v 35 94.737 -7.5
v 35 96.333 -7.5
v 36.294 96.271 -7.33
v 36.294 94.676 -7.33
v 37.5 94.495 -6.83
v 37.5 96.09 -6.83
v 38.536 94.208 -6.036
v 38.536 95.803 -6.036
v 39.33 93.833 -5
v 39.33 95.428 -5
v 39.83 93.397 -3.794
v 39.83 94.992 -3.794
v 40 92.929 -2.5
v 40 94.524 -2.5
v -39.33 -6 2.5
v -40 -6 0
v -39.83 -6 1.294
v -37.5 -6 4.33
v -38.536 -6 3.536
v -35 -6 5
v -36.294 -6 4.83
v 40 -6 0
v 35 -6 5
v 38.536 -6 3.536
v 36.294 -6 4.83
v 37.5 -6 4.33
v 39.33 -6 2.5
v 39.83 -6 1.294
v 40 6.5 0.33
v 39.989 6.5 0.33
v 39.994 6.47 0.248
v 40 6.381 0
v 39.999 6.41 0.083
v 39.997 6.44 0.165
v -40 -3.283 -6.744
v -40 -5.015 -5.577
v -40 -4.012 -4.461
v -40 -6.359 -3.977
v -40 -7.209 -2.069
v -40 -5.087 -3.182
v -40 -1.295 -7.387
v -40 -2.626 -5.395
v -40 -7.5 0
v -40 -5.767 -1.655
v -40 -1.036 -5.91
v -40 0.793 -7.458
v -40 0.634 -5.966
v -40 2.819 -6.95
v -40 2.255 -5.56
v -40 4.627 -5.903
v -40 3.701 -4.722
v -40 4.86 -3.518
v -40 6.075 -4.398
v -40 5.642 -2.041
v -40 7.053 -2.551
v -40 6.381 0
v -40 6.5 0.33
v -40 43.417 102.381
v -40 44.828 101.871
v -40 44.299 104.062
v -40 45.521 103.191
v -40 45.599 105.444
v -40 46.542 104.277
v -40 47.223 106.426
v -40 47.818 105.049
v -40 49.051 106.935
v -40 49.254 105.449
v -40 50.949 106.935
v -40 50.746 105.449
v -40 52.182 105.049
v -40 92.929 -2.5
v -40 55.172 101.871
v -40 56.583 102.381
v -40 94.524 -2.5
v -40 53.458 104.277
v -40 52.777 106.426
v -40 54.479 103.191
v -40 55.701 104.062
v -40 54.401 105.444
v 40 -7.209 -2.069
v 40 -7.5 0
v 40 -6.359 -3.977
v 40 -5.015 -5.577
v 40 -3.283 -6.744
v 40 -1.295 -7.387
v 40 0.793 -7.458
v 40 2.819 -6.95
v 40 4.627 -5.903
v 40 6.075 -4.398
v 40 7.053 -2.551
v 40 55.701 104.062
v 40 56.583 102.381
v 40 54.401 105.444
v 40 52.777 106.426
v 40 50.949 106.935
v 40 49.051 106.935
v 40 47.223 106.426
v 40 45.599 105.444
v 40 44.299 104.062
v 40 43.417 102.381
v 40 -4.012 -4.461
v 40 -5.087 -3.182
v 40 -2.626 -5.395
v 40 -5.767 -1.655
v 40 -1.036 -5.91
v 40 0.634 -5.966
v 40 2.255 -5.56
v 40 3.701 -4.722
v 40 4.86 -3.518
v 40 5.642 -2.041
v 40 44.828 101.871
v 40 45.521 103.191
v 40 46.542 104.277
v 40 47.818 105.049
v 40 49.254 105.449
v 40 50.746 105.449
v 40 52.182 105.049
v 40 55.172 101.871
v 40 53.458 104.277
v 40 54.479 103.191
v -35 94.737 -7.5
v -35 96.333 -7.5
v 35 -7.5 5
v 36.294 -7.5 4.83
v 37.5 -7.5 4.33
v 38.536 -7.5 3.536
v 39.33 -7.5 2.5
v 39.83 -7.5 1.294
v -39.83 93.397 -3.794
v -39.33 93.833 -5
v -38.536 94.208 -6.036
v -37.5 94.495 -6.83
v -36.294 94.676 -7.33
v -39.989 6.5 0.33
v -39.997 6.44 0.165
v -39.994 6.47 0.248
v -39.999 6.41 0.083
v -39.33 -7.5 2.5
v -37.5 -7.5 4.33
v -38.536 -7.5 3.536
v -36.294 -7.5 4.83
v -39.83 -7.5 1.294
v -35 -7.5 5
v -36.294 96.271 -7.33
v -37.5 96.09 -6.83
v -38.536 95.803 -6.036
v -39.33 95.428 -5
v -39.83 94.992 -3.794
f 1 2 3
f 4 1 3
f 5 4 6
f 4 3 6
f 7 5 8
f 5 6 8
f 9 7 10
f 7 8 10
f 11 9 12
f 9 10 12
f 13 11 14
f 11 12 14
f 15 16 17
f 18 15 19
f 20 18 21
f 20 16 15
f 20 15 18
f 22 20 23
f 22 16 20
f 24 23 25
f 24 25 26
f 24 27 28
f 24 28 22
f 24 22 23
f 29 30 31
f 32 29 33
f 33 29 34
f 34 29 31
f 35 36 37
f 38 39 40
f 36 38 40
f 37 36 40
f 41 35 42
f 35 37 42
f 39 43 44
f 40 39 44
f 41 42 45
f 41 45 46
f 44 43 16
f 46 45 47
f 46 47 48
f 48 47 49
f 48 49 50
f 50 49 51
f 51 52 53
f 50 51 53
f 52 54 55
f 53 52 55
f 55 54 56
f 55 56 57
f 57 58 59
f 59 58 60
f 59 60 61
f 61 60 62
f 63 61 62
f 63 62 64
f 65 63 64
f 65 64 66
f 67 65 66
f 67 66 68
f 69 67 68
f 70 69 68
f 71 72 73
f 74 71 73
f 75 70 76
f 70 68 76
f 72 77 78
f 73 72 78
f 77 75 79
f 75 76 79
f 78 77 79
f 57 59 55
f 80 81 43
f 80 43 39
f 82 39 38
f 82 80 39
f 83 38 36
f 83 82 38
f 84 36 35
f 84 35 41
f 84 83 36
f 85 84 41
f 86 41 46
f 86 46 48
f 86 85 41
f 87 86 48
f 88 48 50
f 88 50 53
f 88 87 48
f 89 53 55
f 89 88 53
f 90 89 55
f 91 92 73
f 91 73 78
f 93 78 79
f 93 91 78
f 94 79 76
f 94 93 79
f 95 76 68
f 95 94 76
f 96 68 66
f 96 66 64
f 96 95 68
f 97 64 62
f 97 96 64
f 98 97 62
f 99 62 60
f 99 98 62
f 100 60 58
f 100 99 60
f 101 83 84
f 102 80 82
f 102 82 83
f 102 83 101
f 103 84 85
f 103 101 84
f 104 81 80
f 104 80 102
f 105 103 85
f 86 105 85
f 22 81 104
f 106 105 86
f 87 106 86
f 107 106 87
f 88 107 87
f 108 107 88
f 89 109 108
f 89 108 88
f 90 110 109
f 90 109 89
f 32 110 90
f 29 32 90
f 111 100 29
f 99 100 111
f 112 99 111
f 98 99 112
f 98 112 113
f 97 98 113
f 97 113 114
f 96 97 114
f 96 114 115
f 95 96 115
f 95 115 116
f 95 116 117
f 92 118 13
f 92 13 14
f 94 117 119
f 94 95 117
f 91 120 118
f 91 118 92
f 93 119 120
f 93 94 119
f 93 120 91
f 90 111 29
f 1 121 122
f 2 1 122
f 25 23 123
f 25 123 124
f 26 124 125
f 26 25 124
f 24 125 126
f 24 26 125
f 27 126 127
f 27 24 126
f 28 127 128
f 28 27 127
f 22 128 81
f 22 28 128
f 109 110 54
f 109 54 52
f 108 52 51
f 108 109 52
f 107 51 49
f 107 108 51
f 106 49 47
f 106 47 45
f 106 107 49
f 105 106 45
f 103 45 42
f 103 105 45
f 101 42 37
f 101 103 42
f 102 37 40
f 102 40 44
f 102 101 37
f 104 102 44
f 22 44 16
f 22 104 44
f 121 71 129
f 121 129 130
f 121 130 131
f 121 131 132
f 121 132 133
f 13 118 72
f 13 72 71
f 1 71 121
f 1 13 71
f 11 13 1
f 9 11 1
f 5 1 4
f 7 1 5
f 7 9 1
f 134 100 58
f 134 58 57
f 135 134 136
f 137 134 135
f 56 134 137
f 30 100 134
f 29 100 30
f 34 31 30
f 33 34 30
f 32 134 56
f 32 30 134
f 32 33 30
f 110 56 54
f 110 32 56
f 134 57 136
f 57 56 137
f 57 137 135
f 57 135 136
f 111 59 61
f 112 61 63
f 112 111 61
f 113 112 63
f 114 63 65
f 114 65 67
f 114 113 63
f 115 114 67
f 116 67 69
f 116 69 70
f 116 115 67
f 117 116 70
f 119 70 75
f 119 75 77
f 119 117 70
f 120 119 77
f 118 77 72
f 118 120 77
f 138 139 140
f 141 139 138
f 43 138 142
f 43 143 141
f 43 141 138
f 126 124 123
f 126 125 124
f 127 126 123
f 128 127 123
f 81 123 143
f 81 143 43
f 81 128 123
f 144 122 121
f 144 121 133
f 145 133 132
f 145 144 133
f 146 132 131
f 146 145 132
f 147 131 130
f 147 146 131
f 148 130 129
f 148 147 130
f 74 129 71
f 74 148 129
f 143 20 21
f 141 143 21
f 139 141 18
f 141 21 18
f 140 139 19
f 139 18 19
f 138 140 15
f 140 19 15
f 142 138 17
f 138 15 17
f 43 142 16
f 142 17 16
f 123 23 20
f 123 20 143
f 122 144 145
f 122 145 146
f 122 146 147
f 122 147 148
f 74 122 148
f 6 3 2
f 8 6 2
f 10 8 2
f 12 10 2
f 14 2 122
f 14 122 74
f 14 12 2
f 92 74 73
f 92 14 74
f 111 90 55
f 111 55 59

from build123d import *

# Parameters (mm, degrees)
F1_DEPTH     = 40
F2_T1_DEPTH  = 26.5951332913
F2_T6_DEPTH  = 26.5
F2_T11_DEPTH = 26.5


# Not quite as in the source:
# - a fillet or chamfer that OpenCascade refuses, or shapes differently, is made with other operations: its cross-section is extruded or revolved along the edge and cut away or added


with BuildPart() as f1:
    # F0 (on Right) → F1 (new body, symmetric)
    with BuildSketch(Plane.YZ):
        with BuildLine():
            Line((-7.5, 5), (-7.5, 0))
            ThreePointArc((-7.5, 0), (-1.2951320089, -7.3873292251), (7.0527021545, -2.5513510773))
            Line((7.0527021545, -2.5513510773), (44.82801842, 101.87099079))
            ThreePointArc((44.82801842, 101.87099079), (50, 105.5), (55.17198158, 101.87099079))
            Line((55.17198158, 101.87099079), (94.7374969044, -7.5))
            Line((94.7374969044, -7.5), (96.3326301957, -7.5))
            Line((96.3326301957, -7.5), (56.5825220109, 102.3812610054))
            ThreePointArc((56.5825220109, 102.3812610054), (50, 107), (43.4174779891, 102.3812610054))
            Line((43.4174779891, 102.3812610054), (5.6421617236, -2.0410808618))
            ThreePointArc((5.6421617236, -2.0410808618), (-1.0361056071, -5.9098633801), (-6, 0))
            Line((-6, 0), (-6, 5))
            Line((-6, 5), (-7.5, 5))
        make_face()
    extrude(amount=F1_DEPTH, both=True)

    # F2: fillet of radius 5 on 4 edges, made by hand

    # F2_s2 → F2_t1 (cut)
    with BuildSketch(Plane.XZ.offset(-108.8326301957)):
        with BuildLine():
            ThreePointArc((-35, -7.5), (-38.5355339059, -6.0355339059), (-40, -2.5))
            Line((-40, -2.5), (-40, -7.5))
            Line((-40, -7.5), (-35, -7.5))
        make_face()
        with BuildLine():
            ThreePointArc((35, -7.5), (38.5355339059, -6.0355339059), (40, -2.5))
            Line((40, -2.5), (40, -7.5))
            Line((40, -7.5), (35, -7.5))
        make_face()
    extrude(amount=F2_T1_DEPTH, mode=Mode.SUBTRACT)


with BuildPart() as f2_tool4:
    # F2_s5 → F2_t6 (new body)
    with BuildSketch(Plane.XZ.offset(-6.5)):
        with BuildLine():
            ThreePointArc((35, 5), (38.5355339059, 3.5355339059), (40, 0))
            Line((40, 0), (40, 5))
            Line((40, 5), (35, 5))
        make_face()
    extrude(amount=F2_T6_DEPTH)

    split(bisect_by=Plane(origin=(0, 5.6421617236, -2.0410808618), x_dir=(1, 0, 0), z_dir=(0, -0.9403602873, 0.3401801436)), keep=Keep.TOP)


with BuildPart() as f1_1:
    add(f1.part)

    # F2_t3: cut F2_tool4
    add(f2_tool4.part, mode=Mode.SUBTRACT)


with BuildPart() as f2_tool9:
    # F2_s10 → F2_t11 (new body)
    with BuildSketch(Plane.XZ.offset(-6.5)):
        with BuildLine():
            ThreePointArc((-35, 5), (-38.5355339059, 3.5355339059), (-40, 0))
            Line((-40, 0), (-40, 5))
            Line((-40, 5), (-35, 5))
        make_face()
    extrude(amount=F2_T11_DEPTH)

    split(bisect_by=Plane(origin=(0, 5.6421617236, -2.0410808618), x_dir=(1, 0, 0), z_dir=(0, -0.9403602873, 0.3401801436)), keep=Keep.TOP)


with BuildPart() as f1_2:
    add(f1_1.part)

    # F2_t8: cut F2_tool9
    add(f2_tool9.part, mode=Mode.SUBTRACT)


solid = f1_2.part
